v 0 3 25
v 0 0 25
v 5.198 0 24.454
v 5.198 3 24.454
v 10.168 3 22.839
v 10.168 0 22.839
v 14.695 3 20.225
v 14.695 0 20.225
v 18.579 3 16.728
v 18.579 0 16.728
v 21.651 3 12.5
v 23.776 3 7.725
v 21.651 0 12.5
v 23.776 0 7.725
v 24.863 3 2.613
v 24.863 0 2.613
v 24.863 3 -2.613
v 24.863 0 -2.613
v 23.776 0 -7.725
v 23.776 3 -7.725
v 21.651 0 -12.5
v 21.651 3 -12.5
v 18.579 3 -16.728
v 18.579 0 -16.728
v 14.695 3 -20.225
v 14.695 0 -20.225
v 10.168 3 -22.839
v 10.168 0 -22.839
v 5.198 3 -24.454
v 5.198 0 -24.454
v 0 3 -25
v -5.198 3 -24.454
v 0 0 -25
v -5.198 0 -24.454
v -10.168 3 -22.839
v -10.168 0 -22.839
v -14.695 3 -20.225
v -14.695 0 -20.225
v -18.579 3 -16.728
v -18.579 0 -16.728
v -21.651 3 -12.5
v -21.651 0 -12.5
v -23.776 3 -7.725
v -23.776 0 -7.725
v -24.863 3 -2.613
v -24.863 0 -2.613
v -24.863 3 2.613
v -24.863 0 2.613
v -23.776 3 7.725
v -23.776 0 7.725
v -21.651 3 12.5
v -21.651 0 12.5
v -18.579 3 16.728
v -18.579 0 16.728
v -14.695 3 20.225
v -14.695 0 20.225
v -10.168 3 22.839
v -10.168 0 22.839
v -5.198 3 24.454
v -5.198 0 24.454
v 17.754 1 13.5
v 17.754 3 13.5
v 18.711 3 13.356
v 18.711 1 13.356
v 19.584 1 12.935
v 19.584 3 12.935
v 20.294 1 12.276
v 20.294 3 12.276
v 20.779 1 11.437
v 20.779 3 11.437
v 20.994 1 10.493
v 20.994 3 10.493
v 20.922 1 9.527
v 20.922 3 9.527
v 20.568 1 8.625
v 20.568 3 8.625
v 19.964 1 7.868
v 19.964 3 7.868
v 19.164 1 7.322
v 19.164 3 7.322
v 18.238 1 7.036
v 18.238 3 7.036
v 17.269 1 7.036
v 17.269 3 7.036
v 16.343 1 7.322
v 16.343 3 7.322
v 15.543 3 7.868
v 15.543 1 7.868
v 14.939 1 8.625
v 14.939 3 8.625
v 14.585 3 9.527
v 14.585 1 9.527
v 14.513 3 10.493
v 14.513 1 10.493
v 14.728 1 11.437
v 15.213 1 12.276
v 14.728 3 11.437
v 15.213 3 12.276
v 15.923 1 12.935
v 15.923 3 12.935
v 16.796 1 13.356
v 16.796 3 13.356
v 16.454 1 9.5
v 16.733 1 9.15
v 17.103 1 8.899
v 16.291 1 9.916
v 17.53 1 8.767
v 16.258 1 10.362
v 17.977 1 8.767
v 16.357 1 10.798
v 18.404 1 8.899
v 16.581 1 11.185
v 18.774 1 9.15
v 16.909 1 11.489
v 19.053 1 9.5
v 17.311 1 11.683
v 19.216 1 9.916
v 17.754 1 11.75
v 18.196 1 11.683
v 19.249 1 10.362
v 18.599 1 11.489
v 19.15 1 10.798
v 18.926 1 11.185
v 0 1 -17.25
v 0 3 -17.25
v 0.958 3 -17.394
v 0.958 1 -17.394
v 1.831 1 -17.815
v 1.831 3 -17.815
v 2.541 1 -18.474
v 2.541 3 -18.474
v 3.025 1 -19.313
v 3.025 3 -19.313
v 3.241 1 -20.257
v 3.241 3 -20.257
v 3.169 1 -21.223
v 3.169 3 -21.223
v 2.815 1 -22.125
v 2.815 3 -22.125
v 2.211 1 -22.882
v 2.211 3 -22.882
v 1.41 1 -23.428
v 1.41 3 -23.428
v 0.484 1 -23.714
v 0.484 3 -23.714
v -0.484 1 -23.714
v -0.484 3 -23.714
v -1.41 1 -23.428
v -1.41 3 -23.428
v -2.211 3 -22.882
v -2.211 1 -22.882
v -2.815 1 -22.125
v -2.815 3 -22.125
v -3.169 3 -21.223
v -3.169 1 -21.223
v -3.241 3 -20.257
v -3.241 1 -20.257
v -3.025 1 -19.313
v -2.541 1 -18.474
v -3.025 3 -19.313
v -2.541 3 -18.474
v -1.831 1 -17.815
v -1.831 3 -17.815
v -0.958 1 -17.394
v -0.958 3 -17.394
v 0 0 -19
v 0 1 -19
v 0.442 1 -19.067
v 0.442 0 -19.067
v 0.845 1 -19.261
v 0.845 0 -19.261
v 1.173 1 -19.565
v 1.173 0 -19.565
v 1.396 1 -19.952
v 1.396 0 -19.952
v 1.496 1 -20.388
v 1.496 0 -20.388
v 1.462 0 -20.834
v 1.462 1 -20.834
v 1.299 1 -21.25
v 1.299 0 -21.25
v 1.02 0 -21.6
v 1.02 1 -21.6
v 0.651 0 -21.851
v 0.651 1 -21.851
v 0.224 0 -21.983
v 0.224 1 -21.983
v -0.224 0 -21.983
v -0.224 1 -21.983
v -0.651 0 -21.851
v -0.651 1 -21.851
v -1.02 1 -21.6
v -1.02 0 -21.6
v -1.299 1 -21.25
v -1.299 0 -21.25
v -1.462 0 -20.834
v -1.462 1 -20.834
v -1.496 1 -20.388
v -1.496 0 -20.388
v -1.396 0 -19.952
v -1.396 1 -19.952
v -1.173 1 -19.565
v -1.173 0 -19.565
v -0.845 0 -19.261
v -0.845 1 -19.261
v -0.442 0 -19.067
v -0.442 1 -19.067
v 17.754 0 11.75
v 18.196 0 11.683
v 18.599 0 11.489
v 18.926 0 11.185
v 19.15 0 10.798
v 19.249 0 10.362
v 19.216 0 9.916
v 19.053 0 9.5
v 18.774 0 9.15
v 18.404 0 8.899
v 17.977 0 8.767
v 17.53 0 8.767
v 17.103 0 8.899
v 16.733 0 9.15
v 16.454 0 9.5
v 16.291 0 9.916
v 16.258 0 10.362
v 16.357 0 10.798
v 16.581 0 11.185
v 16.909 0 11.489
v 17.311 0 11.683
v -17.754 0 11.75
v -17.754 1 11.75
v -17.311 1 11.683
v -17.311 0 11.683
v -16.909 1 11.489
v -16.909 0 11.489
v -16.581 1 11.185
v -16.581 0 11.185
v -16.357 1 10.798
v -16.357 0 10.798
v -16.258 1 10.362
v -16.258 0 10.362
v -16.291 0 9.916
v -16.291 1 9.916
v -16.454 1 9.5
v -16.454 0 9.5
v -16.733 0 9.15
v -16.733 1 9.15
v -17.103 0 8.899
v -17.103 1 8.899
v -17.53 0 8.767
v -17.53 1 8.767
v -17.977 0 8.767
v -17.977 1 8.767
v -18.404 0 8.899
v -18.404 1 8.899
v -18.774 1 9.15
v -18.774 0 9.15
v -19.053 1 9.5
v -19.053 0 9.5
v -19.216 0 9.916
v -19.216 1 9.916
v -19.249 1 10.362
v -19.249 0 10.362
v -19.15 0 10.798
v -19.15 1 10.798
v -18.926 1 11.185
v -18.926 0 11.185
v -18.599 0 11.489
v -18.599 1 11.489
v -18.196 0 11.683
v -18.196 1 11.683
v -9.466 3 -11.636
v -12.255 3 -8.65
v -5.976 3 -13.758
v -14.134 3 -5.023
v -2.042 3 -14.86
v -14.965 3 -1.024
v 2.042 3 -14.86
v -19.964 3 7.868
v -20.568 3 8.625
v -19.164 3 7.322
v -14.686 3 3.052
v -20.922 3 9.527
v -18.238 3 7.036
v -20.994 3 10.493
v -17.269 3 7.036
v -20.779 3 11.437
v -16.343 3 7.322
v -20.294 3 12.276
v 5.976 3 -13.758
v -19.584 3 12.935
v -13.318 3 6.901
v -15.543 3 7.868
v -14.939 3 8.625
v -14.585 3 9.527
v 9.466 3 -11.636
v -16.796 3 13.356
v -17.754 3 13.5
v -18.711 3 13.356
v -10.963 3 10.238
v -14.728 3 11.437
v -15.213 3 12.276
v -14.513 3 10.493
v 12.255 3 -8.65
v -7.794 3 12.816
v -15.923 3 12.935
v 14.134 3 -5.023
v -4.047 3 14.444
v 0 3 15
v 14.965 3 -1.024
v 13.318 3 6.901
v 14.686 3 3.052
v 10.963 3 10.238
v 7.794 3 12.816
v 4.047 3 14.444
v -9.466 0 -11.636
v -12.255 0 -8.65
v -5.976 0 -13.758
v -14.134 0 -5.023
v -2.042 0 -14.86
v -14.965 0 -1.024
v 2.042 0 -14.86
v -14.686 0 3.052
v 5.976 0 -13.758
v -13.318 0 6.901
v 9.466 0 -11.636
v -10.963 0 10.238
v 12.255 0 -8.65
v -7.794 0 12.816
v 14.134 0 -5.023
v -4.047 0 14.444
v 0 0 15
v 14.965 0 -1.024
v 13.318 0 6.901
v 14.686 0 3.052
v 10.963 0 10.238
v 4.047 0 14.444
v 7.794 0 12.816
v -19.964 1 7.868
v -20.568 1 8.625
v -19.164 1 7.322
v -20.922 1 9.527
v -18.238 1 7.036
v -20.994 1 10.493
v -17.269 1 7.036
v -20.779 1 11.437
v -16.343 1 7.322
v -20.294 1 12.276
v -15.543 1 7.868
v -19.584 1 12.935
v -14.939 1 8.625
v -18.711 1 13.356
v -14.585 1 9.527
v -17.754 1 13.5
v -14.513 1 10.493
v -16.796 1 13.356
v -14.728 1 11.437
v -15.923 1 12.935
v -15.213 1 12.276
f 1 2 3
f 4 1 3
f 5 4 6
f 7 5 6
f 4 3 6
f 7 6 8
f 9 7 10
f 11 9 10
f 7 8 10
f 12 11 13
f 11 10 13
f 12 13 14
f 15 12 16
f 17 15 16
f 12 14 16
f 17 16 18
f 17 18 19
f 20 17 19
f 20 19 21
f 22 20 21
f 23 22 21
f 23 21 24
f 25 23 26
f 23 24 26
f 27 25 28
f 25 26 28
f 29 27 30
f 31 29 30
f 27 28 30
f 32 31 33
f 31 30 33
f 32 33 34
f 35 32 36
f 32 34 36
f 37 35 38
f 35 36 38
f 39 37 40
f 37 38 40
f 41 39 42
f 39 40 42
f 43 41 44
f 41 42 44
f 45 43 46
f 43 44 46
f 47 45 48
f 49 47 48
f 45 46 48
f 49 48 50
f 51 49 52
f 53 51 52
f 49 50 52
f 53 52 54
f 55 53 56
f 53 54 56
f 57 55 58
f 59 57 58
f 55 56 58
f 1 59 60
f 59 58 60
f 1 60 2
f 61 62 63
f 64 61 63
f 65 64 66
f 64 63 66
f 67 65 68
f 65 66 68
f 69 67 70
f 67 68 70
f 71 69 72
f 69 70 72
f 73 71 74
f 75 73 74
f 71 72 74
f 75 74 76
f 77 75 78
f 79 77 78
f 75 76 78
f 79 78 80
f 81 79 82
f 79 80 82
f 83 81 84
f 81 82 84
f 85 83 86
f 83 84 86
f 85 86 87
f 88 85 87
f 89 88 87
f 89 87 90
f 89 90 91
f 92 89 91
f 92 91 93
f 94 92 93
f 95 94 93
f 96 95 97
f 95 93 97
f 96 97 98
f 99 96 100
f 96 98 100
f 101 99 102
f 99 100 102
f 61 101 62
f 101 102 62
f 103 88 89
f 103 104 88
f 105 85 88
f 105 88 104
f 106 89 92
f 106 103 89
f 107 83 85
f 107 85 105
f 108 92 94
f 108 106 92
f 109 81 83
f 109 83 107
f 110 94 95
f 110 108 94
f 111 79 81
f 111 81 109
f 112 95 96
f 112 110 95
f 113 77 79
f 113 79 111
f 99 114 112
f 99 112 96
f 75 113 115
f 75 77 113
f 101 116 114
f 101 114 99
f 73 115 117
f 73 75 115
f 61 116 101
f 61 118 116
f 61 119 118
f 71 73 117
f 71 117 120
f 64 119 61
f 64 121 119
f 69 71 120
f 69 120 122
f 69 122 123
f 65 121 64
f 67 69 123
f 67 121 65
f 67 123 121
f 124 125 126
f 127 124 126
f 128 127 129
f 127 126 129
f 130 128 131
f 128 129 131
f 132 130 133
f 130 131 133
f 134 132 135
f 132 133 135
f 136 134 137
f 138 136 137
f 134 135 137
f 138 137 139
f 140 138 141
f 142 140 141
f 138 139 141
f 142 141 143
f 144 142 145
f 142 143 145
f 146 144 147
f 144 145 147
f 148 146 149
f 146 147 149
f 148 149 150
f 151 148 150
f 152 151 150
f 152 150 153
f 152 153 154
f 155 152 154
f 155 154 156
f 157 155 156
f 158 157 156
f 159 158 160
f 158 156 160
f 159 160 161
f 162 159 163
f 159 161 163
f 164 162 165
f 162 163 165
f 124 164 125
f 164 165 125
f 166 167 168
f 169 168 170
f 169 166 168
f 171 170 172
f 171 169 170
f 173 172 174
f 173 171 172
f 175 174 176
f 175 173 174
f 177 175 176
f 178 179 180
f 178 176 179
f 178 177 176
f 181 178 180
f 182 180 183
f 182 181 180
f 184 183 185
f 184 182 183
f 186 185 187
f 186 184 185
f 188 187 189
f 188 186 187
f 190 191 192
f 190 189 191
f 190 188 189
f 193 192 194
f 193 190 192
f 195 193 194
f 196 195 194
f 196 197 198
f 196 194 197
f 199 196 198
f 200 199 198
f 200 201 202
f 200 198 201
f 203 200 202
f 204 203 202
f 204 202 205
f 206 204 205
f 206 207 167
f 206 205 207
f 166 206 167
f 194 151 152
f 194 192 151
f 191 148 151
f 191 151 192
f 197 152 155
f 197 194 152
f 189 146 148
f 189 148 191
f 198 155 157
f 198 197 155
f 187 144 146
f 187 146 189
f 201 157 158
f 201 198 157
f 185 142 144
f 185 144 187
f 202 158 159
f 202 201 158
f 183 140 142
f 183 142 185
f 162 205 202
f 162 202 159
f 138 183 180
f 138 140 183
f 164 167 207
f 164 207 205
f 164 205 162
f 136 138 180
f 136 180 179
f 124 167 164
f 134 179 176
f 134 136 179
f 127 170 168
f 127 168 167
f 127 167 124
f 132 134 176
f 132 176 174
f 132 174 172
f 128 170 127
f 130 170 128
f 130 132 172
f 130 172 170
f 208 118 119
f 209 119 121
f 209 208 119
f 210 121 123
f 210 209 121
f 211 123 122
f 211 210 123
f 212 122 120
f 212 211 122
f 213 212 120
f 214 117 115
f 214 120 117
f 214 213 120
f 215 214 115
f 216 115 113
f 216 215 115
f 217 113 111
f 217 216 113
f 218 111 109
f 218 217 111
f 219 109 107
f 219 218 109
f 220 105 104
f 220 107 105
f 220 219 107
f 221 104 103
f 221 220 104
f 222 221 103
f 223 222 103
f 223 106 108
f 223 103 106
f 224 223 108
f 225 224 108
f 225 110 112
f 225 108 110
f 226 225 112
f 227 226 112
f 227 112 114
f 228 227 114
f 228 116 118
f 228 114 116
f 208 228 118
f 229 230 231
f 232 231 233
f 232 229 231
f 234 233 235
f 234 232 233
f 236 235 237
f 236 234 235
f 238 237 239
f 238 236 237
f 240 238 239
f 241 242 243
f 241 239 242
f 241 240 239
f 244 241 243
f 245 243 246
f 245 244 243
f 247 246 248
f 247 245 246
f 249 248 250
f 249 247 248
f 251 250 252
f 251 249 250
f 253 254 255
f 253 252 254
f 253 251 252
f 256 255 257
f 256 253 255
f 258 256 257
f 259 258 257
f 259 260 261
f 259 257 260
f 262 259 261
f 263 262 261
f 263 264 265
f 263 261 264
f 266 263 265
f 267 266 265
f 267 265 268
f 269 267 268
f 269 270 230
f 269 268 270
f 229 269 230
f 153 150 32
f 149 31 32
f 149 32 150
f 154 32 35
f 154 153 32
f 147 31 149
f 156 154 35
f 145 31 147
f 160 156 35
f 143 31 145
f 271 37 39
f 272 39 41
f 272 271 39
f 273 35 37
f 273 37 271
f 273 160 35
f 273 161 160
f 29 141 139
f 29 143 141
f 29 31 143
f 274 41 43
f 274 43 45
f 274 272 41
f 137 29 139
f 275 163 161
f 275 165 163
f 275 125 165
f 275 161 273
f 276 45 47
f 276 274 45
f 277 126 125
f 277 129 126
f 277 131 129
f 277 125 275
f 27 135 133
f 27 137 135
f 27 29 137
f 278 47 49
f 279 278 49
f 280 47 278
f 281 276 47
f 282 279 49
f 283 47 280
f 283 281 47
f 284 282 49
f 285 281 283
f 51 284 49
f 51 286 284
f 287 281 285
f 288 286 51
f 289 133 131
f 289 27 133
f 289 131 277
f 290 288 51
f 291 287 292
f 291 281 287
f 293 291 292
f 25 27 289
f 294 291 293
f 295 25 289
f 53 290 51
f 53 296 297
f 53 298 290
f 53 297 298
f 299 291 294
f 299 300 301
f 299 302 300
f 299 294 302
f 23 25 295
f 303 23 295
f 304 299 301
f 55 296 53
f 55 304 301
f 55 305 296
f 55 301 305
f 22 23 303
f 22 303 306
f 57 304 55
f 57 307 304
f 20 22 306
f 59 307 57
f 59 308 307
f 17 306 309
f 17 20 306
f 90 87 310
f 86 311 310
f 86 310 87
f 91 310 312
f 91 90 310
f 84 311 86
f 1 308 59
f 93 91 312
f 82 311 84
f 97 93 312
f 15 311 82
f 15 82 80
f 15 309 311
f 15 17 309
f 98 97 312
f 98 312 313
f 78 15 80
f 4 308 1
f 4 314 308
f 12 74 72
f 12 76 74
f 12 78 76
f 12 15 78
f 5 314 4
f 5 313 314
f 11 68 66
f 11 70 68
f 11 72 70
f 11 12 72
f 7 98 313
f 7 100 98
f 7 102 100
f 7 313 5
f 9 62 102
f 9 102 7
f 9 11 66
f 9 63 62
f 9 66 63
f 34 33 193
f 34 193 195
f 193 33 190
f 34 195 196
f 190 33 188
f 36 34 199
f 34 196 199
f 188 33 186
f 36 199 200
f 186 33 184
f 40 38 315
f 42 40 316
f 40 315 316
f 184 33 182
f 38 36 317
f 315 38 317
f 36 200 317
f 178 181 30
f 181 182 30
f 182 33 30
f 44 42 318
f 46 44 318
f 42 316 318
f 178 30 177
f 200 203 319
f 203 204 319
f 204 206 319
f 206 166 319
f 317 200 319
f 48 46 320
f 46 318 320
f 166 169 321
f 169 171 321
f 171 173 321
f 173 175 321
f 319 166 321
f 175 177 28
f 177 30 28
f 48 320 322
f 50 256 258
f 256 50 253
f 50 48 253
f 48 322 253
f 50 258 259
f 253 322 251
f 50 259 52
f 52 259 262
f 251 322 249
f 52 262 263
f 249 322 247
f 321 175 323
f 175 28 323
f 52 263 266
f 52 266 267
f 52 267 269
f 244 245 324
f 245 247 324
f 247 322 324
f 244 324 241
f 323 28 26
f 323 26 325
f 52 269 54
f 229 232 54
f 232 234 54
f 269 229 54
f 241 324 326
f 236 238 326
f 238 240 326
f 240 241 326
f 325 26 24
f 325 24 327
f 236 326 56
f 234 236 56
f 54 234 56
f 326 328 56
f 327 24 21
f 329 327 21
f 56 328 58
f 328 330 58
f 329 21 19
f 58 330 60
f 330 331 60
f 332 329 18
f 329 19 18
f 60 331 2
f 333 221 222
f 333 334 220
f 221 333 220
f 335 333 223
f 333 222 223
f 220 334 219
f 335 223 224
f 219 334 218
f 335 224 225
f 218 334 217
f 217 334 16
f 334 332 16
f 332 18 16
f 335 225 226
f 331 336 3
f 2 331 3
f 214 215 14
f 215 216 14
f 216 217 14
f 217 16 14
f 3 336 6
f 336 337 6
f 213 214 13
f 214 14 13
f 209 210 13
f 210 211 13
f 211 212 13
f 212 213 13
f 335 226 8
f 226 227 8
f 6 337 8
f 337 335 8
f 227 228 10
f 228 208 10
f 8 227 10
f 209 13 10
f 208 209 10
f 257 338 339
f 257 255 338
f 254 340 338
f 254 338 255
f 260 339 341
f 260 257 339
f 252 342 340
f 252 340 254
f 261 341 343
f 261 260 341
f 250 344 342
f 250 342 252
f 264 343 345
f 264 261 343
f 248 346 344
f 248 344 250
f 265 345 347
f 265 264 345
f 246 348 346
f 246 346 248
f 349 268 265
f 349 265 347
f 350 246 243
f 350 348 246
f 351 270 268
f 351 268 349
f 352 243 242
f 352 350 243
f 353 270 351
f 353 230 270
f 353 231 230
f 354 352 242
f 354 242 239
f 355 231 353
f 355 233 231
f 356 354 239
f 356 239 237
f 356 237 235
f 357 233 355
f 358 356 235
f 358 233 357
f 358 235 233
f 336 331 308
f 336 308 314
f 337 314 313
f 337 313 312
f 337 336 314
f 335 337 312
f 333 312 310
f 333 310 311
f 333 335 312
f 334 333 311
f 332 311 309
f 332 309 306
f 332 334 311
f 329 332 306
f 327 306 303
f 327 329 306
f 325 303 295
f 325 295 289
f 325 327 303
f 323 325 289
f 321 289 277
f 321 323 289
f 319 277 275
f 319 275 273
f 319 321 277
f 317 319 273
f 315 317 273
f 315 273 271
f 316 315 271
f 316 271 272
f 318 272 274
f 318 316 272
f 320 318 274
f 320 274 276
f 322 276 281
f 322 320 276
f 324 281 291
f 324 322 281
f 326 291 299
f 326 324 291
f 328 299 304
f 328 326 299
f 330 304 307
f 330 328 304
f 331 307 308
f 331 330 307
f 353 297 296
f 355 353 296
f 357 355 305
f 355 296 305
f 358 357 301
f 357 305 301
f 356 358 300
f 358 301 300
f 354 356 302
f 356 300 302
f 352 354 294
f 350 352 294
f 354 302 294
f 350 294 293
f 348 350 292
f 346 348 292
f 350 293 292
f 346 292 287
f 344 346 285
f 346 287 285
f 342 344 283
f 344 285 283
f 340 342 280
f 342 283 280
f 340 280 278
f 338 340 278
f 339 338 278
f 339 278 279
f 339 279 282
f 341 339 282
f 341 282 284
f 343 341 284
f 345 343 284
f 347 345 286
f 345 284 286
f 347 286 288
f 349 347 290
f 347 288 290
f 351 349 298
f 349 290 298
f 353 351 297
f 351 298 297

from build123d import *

# Parameters (mm, degrees)
SKETCH1_R           = 25
SKETCH1_R_2         = 1.5
SKETCH1_R_3         = 15
BOSS_EXTRUDE1_DEPTH = 3
SKETCH2_R           = 3.25
CUT_EXTRUDE1_DEPTH  = 2


with BuildPart() as part:
    # Sketch1 → Boss-Extrude1 (new body)
    with BuildSketch(Plane(origin=(0, 0, 0), x_dir=(1, 0, 0), z_dir=(0, 1, 0))):
        with Locations(Location((0, 0, 0), (0, 0, 270))):
            Circle(SKETCH1_R)
        with Locations(Location((0, 20.5, 0), (0, 0, 270))):
            Circle(SKETCH1_R_2, mode=Mode.SUBTRACT)
        with Locations(Location((17.753520778, -10.25, 0), (0, 0, 270))):
            Circle(SKETCH1_R_2, mode=Mode.SUBTRACT)
        with Locations(Location((-17.753520778, -10.25, 0), (0, 0, 270))):
            Circle(SKETCH1_R_2, mode=Mode.SUBTRACT)
        with Locations(Location((0, 0, 0), (0, 0, 270))):
            Circle(SKETCH1_R_3, mode=Mode.SUBTRACT)
    extrude(amount=BOSS_EXTRUDE1_DEPTH)

    # Sketch2 → Cut-Extrude1 (cut)
    with BuildSketch(Plane(origin=(0, 3, 0), x_dir=(1, 0, 0), z_dir=(0, 1, 0))):
        with Locations(Location((0, 20.5, 0), (0, 0, 270))):
            Circle(SKETCH2_R)
        with Locations(Location((17.753520778, -10.25, 0), (0, 0, 270))):
            Circle(SKETCH2_R)
        with Locations(Location((-17.753520778, -10.25, 0), (0, 0, 270))):
            Circle(SKETCH2_R)
    extrude(amount=-CUT_EXTRUDE1_DEPTH, mode=Mode.SUBTRACT)


solid = part.part
